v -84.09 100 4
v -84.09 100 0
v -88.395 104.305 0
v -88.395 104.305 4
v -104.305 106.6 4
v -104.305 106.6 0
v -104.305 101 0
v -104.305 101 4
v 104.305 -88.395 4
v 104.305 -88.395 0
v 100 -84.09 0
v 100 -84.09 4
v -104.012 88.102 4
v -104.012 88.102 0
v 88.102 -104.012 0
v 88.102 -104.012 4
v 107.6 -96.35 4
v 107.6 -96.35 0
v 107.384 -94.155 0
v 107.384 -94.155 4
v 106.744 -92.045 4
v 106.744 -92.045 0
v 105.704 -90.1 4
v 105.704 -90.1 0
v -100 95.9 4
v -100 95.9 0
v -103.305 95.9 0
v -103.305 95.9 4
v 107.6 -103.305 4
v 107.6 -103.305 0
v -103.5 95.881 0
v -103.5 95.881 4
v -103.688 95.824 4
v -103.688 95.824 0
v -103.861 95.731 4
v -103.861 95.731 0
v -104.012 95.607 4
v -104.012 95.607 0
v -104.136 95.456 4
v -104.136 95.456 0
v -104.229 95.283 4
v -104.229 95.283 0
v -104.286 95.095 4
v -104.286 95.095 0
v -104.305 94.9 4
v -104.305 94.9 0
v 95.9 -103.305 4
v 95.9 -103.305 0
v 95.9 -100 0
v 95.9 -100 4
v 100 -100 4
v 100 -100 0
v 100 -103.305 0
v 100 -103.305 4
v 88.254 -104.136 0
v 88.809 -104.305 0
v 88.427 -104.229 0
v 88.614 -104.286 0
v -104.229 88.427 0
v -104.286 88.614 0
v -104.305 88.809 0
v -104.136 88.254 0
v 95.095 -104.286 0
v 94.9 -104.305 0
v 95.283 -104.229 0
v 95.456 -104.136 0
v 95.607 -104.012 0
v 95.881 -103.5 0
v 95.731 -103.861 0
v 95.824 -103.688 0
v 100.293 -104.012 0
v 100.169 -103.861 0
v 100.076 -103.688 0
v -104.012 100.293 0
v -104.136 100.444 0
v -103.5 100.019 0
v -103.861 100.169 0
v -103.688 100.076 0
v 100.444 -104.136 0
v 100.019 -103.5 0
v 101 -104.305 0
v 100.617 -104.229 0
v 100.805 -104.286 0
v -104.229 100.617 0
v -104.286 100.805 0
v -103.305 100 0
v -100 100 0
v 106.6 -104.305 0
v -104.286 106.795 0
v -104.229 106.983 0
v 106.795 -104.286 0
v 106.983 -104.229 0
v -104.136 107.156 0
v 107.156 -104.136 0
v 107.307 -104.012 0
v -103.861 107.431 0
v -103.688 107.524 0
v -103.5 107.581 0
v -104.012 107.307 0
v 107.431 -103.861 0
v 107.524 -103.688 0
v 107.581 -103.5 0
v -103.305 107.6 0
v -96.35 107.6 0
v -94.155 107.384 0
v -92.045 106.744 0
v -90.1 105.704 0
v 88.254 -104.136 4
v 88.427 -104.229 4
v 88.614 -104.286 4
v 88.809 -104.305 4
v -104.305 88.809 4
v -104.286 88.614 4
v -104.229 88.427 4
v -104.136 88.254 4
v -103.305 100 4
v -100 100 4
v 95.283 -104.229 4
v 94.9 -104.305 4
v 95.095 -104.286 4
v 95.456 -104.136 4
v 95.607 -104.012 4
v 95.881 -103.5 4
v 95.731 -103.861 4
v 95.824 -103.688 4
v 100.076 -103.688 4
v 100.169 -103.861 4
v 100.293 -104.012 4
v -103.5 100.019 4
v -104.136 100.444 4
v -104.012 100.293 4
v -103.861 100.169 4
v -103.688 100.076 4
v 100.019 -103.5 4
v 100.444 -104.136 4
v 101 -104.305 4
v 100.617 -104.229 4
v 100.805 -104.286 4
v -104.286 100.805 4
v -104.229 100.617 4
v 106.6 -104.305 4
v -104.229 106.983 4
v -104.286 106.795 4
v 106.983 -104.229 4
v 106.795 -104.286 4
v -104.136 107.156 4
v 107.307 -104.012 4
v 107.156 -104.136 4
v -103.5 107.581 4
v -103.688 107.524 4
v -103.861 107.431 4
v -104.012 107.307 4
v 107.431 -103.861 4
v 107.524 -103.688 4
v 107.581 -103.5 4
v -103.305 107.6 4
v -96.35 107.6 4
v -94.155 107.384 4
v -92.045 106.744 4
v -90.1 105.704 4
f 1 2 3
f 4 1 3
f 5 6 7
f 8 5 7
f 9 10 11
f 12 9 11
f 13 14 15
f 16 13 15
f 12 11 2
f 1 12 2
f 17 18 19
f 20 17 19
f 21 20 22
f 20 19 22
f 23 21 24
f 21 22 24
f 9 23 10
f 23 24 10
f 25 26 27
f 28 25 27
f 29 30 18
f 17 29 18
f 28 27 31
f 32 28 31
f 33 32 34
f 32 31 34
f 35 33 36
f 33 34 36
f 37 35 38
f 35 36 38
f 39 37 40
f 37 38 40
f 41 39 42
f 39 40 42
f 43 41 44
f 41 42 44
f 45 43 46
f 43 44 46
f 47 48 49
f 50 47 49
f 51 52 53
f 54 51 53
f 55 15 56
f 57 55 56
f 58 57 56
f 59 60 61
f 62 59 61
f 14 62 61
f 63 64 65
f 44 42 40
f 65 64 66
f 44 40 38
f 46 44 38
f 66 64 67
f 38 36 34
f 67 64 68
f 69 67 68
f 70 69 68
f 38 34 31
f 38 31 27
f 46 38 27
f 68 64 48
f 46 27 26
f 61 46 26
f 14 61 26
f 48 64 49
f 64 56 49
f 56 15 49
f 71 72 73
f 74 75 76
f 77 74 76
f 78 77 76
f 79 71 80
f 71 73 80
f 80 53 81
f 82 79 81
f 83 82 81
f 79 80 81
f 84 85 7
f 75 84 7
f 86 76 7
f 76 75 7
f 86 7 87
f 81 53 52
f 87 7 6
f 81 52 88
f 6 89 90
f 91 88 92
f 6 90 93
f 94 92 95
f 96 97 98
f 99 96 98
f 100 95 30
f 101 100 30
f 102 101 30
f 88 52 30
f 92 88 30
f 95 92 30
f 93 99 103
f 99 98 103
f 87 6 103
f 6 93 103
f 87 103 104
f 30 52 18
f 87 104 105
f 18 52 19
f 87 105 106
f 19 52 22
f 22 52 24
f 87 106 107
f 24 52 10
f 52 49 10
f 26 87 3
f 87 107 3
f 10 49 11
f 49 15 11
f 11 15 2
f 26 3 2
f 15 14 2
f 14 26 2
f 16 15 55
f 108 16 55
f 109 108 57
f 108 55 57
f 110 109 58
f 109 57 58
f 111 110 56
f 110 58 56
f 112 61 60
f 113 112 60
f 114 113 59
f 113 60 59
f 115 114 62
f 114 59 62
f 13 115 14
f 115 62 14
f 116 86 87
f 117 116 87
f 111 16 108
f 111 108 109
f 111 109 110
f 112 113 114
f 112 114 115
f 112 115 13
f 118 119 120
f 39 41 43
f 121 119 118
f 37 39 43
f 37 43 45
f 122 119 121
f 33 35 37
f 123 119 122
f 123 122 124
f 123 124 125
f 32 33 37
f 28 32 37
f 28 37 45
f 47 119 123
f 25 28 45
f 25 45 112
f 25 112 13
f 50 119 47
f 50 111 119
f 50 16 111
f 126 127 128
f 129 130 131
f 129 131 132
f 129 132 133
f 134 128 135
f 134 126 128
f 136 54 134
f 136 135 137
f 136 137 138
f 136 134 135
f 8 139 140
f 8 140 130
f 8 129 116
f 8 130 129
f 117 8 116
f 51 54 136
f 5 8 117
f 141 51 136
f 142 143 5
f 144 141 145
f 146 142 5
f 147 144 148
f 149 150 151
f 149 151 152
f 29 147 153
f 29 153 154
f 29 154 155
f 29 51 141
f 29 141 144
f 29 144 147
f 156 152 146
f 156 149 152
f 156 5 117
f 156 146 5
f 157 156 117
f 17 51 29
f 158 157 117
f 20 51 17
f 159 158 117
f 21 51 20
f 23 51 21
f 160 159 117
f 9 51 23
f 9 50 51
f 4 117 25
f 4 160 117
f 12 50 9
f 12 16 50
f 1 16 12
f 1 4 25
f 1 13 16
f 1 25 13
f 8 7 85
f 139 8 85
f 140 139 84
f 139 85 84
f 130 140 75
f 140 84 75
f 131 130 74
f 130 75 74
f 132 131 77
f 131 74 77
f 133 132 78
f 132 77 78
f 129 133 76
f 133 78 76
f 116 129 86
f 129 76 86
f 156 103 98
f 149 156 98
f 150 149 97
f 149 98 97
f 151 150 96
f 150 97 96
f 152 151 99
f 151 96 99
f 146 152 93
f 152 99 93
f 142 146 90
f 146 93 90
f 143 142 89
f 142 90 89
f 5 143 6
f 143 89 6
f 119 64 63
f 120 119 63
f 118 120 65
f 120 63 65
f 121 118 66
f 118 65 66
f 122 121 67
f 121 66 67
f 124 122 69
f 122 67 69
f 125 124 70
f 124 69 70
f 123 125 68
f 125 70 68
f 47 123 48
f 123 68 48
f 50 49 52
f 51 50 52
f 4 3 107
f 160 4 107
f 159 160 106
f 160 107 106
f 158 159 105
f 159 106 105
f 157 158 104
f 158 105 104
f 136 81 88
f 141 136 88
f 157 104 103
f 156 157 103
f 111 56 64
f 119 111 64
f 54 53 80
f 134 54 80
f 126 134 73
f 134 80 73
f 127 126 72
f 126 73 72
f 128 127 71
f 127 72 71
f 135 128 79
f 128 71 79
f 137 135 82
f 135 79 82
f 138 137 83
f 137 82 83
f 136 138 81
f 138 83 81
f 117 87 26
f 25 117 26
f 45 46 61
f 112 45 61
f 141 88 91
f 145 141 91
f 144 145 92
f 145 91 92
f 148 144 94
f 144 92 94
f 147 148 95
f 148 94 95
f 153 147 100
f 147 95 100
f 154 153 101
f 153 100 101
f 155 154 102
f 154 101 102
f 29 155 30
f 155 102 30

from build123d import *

# Parameters (mm, degrees)
BOSS_EXTRUDE1_DEPTH = 4


with BuildPart() as part:
    # Sketch1 → Boss-Extrude1 (new body)
    with BuildSketch(Plane.XY):
        with BuildLine():
            Line((-96.35, 107.6), (-103.304951288, 107.6))
            ThreePointArc((-103.304951288, 107.6), (-104.01205807, 107.307106781), (-104.304951288, 106.6))
            Line((-104.304951288, 106.6), (-104.304951288, 101))
            ThreePointArc((-104.304951288, 101), (-104.01205807, 100.292893219), (-103.304951288, 100))
            Line((-103.304951288, 100), (-100, 100))
            Line((-100, 100), (-100, 95.9))
            Line((-100, 95.9), (-103.304951288, 95.9))
            ThreePointArc((-103.304951288, 95.9), (-104.01205807, 95.607106781), (-104.304951288, 94.9))
            Line((-104.304951288, 94.9), (-104.304951288, 88.809262274))
            ThreePointArc((-104.304951288, 88.809262274), (-104.228830821, 88.426578842), (-104.01205807, 88.102155493))
            Line((-104.01205807, 88.102155493), (-100, 84.090097423))
            Line((-100, 84.090097423), (84.090097423, -100))
            Line((84.090097423, -100), (88.102155493, -104.01205807))
            ThreePointArc((88.102155493, -104.01205807), (88.426578842, -104.228830821), (88.809262274, -104.304951288))
            Line((88.809262274, -104.304951288), (94.9, -104.304951288))
            ThreePointArc((94.9, -104.304951288), (95.607106781, -104.01205807), (95.9, -103.304951288))
            Line((95.9, -103.304951288), (95.9, -100))
            Line((95.9, -100), (100, -100))
            Line((100, -100), (100, -103.304951288))
            ThreePointArc((100, -103.304951288), (100.292893219, -104.01205807), (101, -104.304951288))
            Line((101, -104.304951288), (106.6, -104.304951288))
            ThreePointArc((106.6, -104.304951288), (107.307106781, -104.01205807), (107.6, -103.304951288))
            Line((107.6, -103.304951288), (107.6, -96.35))
            ThreePointArc((107.6, -96.35), (106.743644741, -92.044811386), (104.304951288, -88.395048712))
            Line((104.304951288, -88.395048712), (100, -84.090097423))
            Line((100, -84.090097423), (-84.090097423, 100))
            Line((-84.090097423, 100), (-88.395048712, 104.304951288))
            ThreePointArc((-88.395048712, 104.304951288), (-92.044811386, 106.743644741), (-96.35, 107.6))
        make_face()
    extrude(amount=BOSS_EXTRUDE1_DEPTH)


solid = part.part
